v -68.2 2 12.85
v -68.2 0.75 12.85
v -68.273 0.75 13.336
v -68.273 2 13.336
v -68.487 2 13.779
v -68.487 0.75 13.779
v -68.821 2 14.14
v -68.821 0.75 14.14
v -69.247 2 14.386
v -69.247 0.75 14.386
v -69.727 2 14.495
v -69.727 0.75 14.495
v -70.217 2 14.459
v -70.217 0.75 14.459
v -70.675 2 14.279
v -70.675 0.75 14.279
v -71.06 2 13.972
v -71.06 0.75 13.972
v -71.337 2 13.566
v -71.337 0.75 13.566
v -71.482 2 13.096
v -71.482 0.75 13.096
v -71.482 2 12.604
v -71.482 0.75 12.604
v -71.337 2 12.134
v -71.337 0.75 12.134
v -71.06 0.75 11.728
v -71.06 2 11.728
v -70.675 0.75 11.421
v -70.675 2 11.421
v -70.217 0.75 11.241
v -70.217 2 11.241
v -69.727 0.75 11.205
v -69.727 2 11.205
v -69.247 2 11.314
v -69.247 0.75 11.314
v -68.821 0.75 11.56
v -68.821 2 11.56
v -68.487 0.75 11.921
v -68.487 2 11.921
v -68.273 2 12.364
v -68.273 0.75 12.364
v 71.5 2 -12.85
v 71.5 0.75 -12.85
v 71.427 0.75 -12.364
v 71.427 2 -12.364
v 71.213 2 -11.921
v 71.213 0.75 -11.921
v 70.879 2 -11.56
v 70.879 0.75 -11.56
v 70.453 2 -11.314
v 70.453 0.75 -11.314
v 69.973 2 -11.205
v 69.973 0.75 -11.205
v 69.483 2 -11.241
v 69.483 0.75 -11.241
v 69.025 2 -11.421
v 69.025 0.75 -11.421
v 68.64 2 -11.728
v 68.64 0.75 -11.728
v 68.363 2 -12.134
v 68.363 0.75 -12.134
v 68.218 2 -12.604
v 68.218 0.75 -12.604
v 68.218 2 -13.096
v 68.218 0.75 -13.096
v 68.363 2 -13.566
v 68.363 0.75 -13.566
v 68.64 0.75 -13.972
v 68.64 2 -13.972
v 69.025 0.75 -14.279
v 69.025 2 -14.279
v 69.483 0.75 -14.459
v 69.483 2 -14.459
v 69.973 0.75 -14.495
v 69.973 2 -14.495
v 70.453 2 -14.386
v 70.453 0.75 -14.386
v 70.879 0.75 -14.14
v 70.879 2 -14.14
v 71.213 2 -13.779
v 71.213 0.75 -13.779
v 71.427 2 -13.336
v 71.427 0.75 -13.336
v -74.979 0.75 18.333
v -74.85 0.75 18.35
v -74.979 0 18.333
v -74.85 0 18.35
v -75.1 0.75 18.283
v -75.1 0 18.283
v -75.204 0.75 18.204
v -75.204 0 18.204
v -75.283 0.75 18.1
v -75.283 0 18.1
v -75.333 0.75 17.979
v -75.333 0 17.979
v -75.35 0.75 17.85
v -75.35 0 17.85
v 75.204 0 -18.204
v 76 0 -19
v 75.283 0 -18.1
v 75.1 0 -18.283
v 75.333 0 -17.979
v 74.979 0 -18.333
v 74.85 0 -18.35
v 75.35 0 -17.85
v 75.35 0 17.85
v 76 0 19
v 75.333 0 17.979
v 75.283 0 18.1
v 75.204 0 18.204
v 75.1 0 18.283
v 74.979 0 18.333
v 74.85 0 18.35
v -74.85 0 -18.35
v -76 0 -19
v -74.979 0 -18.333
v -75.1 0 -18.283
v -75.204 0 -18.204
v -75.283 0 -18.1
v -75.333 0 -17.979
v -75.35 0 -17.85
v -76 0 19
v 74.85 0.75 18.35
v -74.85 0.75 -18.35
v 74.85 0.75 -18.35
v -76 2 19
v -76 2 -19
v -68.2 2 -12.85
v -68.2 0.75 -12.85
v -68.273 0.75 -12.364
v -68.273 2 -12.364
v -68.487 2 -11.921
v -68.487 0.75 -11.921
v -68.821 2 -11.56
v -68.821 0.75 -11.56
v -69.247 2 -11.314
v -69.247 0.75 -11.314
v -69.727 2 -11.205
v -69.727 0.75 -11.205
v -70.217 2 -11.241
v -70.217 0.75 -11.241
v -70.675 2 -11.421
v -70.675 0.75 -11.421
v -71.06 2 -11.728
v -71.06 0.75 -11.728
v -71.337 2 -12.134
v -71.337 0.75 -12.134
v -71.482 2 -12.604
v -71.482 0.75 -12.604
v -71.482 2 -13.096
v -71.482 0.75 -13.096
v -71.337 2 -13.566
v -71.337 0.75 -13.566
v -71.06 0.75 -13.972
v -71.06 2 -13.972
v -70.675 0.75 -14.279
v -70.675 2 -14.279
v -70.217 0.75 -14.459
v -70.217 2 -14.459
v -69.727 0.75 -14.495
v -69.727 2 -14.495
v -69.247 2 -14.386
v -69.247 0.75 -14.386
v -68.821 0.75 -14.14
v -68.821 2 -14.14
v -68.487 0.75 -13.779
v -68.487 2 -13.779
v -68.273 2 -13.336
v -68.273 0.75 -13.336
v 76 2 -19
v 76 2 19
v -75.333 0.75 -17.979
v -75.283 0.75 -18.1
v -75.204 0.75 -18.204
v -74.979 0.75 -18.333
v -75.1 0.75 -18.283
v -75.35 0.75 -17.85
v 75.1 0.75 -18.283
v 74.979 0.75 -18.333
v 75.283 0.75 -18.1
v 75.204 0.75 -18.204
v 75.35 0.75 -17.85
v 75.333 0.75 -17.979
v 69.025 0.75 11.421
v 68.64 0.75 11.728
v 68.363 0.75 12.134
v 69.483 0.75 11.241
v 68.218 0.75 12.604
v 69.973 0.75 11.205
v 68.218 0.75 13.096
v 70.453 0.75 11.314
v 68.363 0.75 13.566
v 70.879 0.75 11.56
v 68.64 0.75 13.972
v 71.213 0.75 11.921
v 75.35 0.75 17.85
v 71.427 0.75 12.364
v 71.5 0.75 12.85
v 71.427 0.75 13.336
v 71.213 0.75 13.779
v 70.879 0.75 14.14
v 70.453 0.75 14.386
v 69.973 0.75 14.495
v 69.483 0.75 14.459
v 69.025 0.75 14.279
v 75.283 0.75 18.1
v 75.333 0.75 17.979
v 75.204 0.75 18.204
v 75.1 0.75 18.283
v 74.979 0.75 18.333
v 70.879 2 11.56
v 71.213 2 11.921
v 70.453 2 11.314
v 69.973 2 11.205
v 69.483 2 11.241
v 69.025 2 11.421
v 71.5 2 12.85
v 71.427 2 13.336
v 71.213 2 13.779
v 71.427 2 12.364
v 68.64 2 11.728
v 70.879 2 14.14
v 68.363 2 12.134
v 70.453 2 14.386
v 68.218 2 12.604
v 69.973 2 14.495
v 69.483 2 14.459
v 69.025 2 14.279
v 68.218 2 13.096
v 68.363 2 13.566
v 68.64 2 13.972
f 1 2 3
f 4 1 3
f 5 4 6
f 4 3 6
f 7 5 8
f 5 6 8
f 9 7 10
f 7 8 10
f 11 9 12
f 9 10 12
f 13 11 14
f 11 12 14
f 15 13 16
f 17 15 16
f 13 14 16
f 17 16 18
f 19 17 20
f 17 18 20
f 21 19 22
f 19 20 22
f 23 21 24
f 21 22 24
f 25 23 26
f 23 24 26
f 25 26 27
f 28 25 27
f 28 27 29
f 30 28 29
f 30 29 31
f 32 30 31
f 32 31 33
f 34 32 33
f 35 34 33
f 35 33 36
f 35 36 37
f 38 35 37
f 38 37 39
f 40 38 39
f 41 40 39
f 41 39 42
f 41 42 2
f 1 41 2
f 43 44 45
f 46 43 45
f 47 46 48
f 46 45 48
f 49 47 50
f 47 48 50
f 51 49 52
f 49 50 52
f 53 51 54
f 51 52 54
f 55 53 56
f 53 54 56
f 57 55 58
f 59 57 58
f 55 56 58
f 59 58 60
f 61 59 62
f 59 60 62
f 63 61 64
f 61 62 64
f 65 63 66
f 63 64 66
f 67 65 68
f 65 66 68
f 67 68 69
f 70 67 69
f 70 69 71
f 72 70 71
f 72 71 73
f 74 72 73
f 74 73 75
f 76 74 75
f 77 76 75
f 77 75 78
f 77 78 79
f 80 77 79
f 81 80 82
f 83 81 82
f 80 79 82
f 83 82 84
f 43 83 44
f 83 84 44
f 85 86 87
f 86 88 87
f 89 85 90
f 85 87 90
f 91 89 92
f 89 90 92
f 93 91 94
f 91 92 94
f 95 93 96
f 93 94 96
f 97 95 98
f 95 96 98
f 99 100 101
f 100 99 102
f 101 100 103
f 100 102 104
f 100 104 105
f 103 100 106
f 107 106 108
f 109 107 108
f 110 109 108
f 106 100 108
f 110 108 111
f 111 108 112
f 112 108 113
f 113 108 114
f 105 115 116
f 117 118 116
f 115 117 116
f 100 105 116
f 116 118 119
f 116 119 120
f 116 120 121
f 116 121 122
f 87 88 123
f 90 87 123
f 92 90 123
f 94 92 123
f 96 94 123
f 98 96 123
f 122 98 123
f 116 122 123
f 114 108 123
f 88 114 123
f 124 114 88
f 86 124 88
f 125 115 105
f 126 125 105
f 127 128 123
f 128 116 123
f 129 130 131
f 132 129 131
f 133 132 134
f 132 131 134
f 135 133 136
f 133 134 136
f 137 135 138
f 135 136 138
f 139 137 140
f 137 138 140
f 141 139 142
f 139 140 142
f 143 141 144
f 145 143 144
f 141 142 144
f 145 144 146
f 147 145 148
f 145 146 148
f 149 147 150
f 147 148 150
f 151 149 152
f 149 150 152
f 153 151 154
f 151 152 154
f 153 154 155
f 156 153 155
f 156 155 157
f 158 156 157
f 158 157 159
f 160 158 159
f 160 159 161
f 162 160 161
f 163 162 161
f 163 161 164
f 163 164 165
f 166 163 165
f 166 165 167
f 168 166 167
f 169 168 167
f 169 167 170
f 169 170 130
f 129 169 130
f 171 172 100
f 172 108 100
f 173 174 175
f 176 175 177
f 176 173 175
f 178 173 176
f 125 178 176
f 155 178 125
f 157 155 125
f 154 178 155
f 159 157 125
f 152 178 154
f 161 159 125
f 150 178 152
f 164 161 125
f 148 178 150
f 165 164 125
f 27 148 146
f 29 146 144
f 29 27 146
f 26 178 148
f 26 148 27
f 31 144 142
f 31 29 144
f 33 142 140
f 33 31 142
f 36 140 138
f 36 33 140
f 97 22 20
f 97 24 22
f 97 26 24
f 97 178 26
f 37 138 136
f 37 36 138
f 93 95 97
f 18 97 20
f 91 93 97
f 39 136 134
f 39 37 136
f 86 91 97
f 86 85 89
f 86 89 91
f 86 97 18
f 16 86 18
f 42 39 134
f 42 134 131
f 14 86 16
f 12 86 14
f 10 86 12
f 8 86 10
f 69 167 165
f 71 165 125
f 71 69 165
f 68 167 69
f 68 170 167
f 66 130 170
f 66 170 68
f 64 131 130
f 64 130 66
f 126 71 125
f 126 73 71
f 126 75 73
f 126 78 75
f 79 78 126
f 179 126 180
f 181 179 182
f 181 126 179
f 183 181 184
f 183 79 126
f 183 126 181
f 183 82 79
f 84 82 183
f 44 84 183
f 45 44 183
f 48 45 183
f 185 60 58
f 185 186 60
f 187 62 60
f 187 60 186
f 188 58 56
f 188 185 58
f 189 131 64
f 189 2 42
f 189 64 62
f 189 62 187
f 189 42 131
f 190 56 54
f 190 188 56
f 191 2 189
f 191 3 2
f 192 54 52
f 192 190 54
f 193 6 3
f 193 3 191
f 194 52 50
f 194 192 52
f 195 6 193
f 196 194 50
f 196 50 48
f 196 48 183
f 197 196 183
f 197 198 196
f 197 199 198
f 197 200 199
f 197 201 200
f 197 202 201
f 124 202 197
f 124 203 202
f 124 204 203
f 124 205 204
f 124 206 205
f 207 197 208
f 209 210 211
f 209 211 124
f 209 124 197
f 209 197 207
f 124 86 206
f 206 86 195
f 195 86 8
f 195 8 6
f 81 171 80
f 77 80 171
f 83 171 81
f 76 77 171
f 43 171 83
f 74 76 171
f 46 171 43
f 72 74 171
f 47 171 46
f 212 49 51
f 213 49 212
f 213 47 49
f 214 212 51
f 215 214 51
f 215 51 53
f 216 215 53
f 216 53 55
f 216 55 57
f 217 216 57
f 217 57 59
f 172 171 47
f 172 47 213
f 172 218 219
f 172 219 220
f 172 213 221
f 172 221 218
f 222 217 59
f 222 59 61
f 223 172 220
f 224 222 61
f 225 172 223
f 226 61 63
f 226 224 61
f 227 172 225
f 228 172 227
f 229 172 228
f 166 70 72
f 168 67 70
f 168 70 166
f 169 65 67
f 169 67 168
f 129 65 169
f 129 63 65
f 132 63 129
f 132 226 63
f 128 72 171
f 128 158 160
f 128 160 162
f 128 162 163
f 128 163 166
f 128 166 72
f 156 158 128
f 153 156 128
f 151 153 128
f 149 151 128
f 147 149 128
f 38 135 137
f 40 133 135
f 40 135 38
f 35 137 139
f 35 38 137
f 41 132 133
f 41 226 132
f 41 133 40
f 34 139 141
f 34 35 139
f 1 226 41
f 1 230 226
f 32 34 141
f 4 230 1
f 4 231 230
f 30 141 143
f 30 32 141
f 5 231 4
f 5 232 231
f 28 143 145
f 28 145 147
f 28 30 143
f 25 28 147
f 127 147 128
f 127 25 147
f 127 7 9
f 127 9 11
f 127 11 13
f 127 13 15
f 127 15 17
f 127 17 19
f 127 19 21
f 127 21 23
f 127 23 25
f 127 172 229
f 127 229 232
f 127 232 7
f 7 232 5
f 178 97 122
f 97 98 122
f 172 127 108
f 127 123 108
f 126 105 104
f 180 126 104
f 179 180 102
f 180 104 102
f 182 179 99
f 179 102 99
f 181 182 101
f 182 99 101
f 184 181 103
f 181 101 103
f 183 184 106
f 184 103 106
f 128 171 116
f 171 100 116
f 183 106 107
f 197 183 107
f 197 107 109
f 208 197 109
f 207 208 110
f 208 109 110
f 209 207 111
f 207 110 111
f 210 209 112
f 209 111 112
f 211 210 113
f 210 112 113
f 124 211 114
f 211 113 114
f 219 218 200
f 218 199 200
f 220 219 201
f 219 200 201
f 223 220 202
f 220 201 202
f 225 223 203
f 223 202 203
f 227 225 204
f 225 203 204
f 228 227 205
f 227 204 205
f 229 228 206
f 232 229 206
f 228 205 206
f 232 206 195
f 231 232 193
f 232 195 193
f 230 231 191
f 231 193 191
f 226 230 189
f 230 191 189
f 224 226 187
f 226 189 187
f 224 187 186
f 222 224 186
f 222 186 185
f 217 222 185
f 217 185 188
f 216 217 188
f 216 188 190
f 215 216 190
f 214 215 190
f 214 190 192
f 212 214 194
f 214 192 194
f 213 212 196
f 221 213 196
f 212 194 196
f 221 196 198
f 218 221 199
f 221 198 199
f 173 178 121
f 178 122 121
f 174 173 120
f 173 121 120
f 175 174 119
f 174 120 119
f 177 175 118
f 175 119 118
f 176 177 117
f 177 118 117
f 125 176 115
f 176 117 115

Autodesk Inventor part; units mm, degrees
ref_plane "YZ Plane" through (0, 0, 0) normal (1, 0, 0) x (0, 1, 0)
ref_plane "XZ Plane" through (0, 0, 0) normal (0, 1, 0) x (-1, 0, 0)
ref_plane "XY Plane" through (0, 0, 0) normal (0, 0, 1) x (1, 0, 0)
sketch "Sketch1" plane through (0, 0, 0) normal (0, 1, 0) x (-1, 0, 0)
  line L0 (76, 19) -> (-76, 19)
  line L1 (-76, 19) -> (-76, -19)
  line L2 (-76, -19) -> (76, -19)
  line L3 (76, -19) -> (76, 19)
  line L4 (76, 19) -> (-76, -19) construction
  line L5 (-76, 19) -> (76, -19) construction
  point P0 (0, 0)
  dimension "d0" = 152
  dimension "d1" = 38
extrude "Extrusion1" add sketch "Sketch1" along normal blind 2
sketch "Sketch2" plane through (0, 0, 0) normal (0, -1, 0) x (1, 0, 0)
  line L0 (76, 19) -> (76, -19)
  line L1 (-76, 19) -> (76, 19)
  line L2 (-76, -19) -> (-76, 19)
  line L3 (76, -19) -> (-76, -19)
  line L4 (-76, -19) -> (-76, 19)
  line L5 (-76, 19) -> (76, 19)
  line L6 (-76, -19) -> (76, -19)
  line L7 (76, -19) -> (76, 19)
  line L8 (76, 19) -> (-76, 19)
  line L9 (-76, 19) -> (-76, -19)
  line L10 (-76, -19) -> (-75.15, -19)
  line L11 (76, -19) -> (-76, -19)
  line L12 (76, 19) -> (76, 18.15)
  line L13 (76, 19) -> (76, -19)
  line L14 (-74.85, -18.35) -> (74.85, -18.35)
  line L15 (75.35, -17.85) -> (75.35, 17.85)
  line L16 (74.85, 18.35) -> (-74.85, 18.35)
  line L17 (-75.35, 17.85) -> (-75.35, -17.85)
  line L18 (75.35, -18.35) -> (74.4, -18.35)
  line L19 (-75.35, 18.35) -> (-74.4, 18.35)
  line L20 (73.35, -16.85) -> (-73.35, -16.85)
  line L21 (-73.85, -16.35) -> (-73.85, 16.35)
  line L22 (-73.35, 16.85) -> (73.35, 16.85)
  line L23 (73.85, 16.35) -> (73.85, -16.35)
  arc A0 (-74.85, 18.35) -> (-75.35, 17.85) centre (-74.85, 17.85) ccw
  arc A1 (-73.35, 16.85) -> (-73.85, 16.35) centre (-73.35, 16.35) ccw
  arc A2 (-75.35, -17.85) -> (-74.85, -18.35) centre (-74.85, -17.85) ccw
  arc A3 (-73.85, -16.35) -> (-73.35, -16.85) centre (-73.35, -16.35) ccw
  arc A4 (73.35, -16.85) -> (73.85, -16.35) centre (73.35, -16.35) ccw
  arc A5 (74.85, -18.35) -> (75.35, -17.85) centre (74.85, -17.85) ccw
  arc A6 (73.85, 16.35) -> (73.35, 16.85) centre (73.35, 16.35) ccw
  arc A7 (75.35, 17.85) -> (74.85, 18.35) centre (74.85, 17.85) ccw
  point P0 (0, 0)
  point P1 (-75.35, -18.35)
  point P2 (75.35, 18.35)
  point P3 (73.85, -16.85)
  point P4 (-73.85, 16.85)
  point P5 (-73.85, -16.85)
  point P6 (73.85, 16.85)
  dimension "d28" = 1.5
  dimension "d29" = 1.5
  dimension "d30" = 1.5
  dimension "d32" = 1.5
  dimension "d33" = 0.65
  dimension "d34" = 0.65
  dimension "d35" = 0.65
  dimension "d36" = 0.65
  dimension "d37" = 0.5
extrude "Extrusion2" cut sketch "Sketch2" against normal blind 0.75 contours A2 L17 A0 L16 A7 L15 A5 L14 | L20 A3 L21 A1 L22 A6 L23 A4
sketch "Sketch3" plane through (0, 0, 0) normal (0, -1, 0) x (1, 0, 0)
  line L0 (-74.85, 18.35) -> (74.85, 18.35)
  line L1 (-75.35, -17.85) -> (-75.35, 17.85)
  line L2 (74.85, -18.35) -> (-74.85, -18.35)
  line L3 (75.35, 17.85) -> (75.35, -17.85)
  line L4 (76, 19) -> (76, -19)
  line L5 (-76, 19) -> (76, 19)
  line L6 (-76, -19) -> (-76, 19)
  line L7 (76, -19) -> (-76, -19)
  line L8 (-75.35, -17.85) -> (-75.35, 17.85)
  line L9 (-74.85, 18.35) -> (74.85, 18.35)
  line L10 (75.35, 17.85) -> (75.35, -17.85)
  line L11 (74.85, -18.35) -> (-74.85, -18.35)
  line L12 (-73.85, 16.85) -> (-73.85, -16.85)
  line L13 (-73.85, -16.85) -> (73.85, -16.85)
  line L14 (73.85, -16.85) -> (73.85, 16.85)
  line L15 (73.85, 16.85) -> (-73.85, 16.85)
  line L16 (-73.85, 16.85) -> (-73.85, -16.85)
  line L17 (-73.85, 16.85) -> (-65.85, 16.85)
  line L18 (-65.85, 16.85) -> (-65.85, 8.85)
  line L19 (-65.85, 8.85) -> (-73.85, 8.85)
  line L20 (-73.85, 8.85) -> (-73.85, 16.85)
  line L21 (-73.85, -16.85) -> (-65.85, -16.85)
  line L22 (-65.85, -16.85) -> (-65.85, -8.85)
  line L23 (-65.85, -8.85) -> (-73.85, -8.85)
  line L24 (-73.85, -8.85) -> (-73.85, -16.85)
  line L25 (73.85, -16.85) -> (73.85, 16.85)
  line L26 (73.85, 16.85) -> (65.85, 16.85)
  line L27 (65.85, 16.85) -> (65.85, 8.85)
  line L28 (65.85, 8.85) -> (73.85, 8.85)
  line L29 (73.85, 8.85) -> (73.85, 16.85)
  line L30 (-73.85, -16.85) -> (73.85, -16.85)
  line L31 (73.85, -16.85) -> (65.85, -16.85)
  line L32 (65.85, -16.85) -> (65.85, -8.85)
  line L33 (65.85, -8.85) -> (73.85, -8.85)
  line L34 (73.85, -8.85) -> (73.85, -16.85)
  line L35 (-73.85, -16.85) -> (-65.85, -8.85)
  line L36 (-65.85, -16.85) -> (-73.85, -8.85)
  line L37 (-73.85, 8.85) -> (-65.85, 16.85)
  line L38 (73.85, 16.85) -> (-73.85, 16.85)
  line L39 (-65.85, 8.85) -> (-73.85, 16.85)
  circle A0 centre (-69.85, -12.85) radius 1.65
  circle A1 centre (-69.85, 12.85) radius 1.65
  line L40 (65.85, -16.85) -> (73.85, -8.85)
  line L41 (65.85, 8.85) -> (73.85, 16.85)
  line L42 (73.85, 8.85) -> (65.85, 16.85)
  line L43 (73.85, -16.85) -> (65.85, -8.85)
  circle A2 centre (69.85, -12.85) radius 1.65
  circle A3 centre (69.85, 12.85) radius 1.65
  arc A4 (-75.35, -17.85) -> (-74.85, -18.35) centre (-74.85, -17.85) ccw
  arc A5 (-74.85, 18.35) -> (-75.35, 17.85) centre (-74.85, 17.85) ccw
  arc A6 (75.35, 17.85) -> (74.85, 18.35) centre (74.85, 17.85) ccw
  arc A7 (74.85, -18.35) -> (75.35, -17.85) centre (74.85, -17.85) ccw
  arc A8 (-75.35, -17.85) -> (-74.85, -18.35) centre (-74.85, -17.85) ccw
  arc A9 (74.85, -18.35) -> (75.35, -17.85) centre (74.85, -17.85) ccw
  arc A10 (75.35, 17.85) -> (74.85, 18.35) centre (74.85, 17.85) ccw
  arc A11 (-74.85, 18.35) -> (-75.35, 17.85) centre (-74.85, 17.85) ccw
  point P0 (0, 0)
  dimension "d14" = 8
  dimension "d15" = 8
  dimension "d16" = 8
  dimension "d17" = 8
  dimension "d18" = 8
  dimension "d19" = 8
  dimension "d20" = 8
  dimension "d21" = 8
  dimension "d22" = 3.3
  dimension "d23" = 3.3
  dimension "d24" = 3.3
  dimension "d25" = 3.3
extrude "Extrusion3" cut sketch "Sketch3" against normal blind 3 contours A1 L37 L39 | L39 L37 A1 | L37 L39 A1 | A1 L39 L37 | A0 L35 L36 | L36 L35 A0 | A3 L41 L42 | L42 L41 A3 | L35 L36 A0 | A0 L36 L35 | A3 L42 L41 | L41 L42 A3 | A2 L43 L40 | L40 L43 A2 | A2 L43 L40 | L40 L43 A2
sketch "Sketch4" plane through (0, 0, 0) normal (0, -1, 0) x (1, 0, 0)
  point P0 (0, 0)
properties part number "tapa" material "Steel, Mild, Welded"
